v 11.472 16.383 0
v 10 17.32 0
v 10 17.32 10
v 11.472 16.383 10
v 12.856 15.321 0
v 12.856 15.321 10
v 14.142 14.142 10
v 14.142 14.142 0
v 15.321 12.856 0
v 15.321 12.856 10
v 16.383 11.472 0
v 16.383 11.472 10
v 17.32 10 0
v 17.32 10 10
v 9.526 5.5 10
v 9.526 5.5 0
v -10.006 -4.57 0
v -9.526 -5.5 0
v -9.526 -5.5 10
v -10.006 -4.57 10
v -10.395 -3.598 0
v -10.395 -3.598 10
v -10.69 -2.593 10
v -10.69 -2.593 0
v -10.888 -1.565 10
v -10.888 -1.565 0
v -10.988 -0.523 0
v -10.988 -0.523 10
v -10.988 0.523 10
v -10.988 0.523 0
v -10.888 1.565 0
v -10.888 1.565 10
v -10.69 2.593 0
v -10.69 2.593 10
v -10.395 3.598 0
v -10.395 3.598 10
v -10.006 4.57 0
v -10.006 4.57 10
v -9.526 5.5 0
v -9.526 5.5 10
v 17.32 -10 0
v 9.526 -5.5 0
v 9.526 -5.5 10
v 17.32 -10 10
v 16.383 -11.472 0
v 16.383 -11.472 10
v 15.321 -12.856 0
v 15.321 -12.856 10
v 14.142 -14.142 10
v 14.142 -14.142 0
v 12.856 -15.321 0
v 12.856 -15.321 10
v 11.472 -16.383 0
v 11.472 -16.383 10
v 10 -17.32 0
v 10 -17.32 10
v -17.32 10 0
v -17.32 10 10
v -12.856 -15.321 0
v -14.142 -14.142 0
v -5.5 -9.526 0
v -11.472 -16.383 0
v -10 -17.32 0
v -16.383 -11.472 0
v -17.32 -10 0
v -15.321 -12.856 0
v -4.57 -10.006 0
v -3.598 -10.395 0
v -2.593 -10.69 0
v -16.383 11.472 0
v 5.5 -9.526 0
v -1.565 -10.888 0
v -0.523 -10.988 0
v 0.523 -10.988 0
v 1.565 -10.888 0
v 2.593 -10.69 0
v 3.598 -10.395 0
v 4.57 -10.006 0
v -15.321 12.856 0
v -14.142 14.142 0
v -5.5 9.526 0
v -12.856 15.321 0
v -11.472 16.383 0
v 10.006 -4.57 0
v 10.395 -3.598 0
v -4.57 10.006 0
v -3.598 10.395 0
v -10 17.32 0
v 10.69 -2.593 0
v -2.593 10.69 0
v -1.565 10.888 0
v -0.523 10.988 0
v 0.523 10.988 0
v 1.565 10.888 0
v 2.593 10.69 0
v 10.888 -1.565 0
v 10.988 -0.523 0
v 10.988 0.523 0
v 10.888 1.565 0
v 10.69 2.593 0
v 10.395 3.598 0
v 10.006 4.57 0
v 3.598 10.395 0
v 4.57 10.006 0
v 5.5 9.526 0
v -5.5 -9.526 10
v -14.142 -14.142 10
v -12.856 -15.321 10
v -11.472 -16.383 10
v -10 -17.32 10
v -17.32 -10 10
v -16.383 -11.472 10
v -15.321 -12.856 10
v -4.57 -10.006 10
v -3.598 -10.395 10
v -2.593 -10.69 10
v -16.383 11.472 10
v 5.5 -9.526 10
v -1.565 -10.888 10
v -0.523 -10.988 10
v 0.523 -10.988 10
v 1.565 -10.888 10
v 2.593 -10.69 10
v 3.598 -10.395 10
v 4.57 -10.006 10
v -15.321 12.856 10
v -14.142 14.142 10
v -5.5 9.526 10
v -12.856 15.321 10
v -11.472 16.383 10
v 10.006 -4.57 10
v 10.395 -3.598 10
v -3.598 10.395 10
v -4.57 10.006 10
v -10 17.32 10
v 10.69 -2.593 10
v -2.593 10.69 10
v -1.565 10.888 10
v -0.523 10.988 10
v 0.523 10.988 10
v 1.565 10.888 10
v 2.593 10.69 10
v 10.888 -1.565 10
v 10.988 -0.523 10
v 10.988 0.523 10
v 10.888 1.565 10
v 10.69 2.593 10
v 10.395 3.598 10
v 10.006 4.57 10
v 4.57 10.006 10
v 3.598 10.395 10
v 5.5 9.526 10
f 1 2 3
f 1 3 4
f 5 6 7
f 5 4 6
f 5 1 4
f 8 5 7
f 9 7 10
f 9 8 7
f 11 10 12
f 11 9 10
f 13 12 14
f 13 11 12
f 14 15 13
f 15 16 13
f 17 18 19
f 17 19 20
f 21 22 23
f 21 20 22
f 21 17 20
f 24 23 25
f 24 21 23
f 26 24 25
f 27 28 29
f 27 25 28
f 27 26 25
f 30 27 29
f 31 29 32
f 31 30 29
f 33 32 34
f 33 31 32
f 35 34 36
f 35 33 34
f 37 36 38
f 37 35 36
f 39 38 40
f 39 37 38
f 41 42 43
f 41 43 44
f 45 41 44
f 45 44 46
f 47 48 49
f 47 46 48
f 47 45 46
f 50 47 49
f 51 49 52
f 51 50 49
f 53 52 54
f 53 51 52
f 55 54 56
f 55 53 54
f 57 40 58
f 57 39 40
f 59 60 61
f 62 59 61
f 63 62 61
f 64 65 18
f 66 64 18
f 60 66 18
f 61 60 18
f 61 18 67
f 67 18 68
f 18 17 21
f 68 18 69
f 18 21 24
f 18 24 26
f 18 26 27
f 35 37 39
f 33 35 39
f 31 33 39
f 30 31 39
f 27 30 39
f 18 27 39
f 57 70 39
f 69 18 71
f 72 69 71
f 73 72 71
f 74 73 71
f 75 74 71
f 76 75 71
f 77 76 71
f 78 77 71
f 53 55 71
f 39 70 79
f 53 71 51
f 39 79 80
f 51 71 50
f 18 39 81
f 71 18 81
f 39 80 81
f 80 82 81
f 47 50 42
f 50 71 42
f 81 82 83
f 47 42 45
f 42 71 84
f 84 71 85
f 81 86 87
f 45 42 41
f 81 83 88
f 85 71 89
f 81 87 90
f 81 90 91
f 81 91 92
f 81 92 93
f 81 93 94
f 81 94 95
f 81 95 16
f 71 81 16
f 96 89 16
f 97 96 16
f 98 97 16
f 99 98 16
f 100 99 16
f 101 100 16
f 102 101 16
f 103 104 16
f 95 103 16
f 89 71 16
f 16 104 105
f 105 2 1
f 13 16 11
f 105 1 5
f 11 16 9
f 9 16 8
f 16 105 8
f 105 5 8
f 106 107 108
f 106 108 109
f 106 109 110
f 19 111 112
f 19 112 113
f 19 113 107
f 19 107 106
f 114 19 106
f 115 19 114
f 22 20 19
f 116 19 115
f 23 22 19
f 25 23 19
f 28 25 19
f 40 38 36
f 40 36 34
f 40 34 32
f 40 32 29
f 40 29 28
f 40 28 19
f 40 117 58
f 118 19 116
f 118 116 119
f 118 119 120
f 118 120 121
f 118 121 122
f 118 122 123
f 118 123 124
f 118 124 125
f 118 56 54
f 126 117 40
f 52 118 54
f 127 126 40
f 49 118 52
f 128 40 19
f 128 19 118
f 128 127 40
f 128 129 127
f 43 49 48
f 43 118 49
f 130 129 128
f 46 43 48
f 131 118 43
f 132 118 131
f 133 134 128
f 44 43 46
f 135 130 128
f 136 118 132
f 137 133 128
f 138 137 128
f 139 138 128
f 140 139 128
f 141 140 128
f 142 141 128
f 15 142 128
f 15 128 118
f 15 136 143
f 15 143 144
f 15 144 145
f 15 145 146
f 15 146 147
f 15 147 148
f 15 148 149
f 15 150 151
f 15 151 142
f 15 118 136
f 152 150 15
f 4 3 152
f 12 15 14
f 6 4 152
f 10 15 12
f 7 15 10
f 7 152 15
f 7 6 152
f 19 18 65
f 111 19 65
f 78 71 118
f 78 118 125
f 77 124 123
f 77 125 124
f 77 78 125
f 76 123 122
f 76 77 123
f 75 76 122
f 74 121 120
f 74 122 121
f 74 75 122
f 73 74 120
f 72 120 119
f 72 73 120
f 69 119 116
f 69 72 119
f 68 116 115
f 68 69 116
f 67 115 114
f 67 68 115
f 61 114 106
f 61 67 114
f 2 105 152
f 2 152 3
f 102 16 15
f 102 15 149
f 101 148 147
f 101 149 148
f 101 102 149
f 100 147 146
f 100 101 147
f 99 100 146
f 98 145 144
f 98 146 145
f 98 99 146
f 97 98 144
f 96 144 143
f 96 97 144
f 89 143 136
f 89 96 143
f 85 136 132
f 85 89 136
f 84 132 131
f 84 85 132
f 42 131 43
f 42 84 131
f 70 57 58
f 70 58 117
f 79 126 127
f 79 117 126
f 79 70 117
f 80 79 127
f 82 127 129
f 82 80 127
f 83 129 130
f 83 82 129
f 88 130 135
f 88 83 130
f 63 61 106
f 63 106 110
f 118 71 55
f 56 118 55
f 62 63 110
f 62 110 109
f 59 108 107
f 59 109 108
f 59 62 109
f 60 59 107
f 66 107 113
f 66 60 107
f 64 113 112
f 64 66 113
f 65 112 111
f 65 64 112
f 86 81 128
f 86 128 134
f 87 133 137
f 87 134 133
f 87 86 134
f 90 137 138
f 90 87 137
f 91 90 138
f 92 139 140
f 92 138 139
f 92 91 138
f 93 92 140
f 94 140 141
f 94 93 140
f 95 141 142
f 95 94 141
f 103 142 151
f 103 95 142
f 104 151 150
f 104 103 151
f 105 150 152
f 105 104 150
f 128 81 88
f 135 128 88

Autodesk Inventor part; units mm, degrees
ref_plane "YZ Plane" through (0, 0, 0) normal (1, 0, 0) x (0, 1, 0)
ref_plane "XZ Plane" through (0, 0, 0) normal (0, 1, 0) x (-1, 0, 0)
ref_plane "XY Plane" through (0, 0, 0) normal (0, 0, 1) x (1, 0, 0)
sketch "Sketch1" plane through (0, 0, 0) normal (0, 0, 1) x (1, 0, 0)
  line L0 (-9.5263, 5.5) -> (-17.3205, 10)
  line L1 (0, 0) -> (20, 0) construction
  line L2 (-9.5263, -5.5) -> (-17.3205, -10)
  line L3 (0, 0) -> (20, 0) construction
  line L4 (5.5, 9.5263) -> (10, 17.3205)
  line L5 (0, 0) -> (20, 0) construction
  line L6 (-5.5, 9.5263) -> (-10, 17.3205)
  line L7 (0, 0) -> (20, 0) construction
  line L8 (5.5, -9.5263) -> (10, -17.3205)
  line L9 (-5.5, -9.5263) -> (-10, -17.3205)
  line L10 (0, 0) -> (0, 20) construction
  line L11 (9.5263, 5.5) -> (17.3205, 10)
  line L12 (9.5263, -5.5) -> (17.3205, -10)
  arc A0 (17.3205, 10) -> (10, 17.3205) centre (0, 0) ccw
  arc A1 (-10, 17.3205) -> (-17.3205, 10) centre (0, 0) ccw
  arc A2 (-17.3205, -10) -> (-10, -17.3205) centre (0, 0) ccw
  arc A3 (10, -17.3205) -> (17.3205, -10) centre (0, 0) ccw
  arc A4 (-9.5263, 5.5) -> (-9.5263, -5.5) centre (0, 0) ccw
  arc A5 (5.5, 9.5263) -> (-5.5, 9.5263) centre (0, 0) ccw
  arc A6 (-5.5, -9.5263) -> (5.5, -9.5263) centre (0, 0) ccw
  arc A7 (9.5263, -5.5) -> (9.5263, 5.5) centre (0, 0) ccw
  dimension "d2" = 150
  dimension "d3" = 150
  dimension "d4" = 60
  dimension "d5" = 120
extrude "Extrusion1" add sketch "Sketch1" along normal blind 10
properties part number "NYLON-JAW"
